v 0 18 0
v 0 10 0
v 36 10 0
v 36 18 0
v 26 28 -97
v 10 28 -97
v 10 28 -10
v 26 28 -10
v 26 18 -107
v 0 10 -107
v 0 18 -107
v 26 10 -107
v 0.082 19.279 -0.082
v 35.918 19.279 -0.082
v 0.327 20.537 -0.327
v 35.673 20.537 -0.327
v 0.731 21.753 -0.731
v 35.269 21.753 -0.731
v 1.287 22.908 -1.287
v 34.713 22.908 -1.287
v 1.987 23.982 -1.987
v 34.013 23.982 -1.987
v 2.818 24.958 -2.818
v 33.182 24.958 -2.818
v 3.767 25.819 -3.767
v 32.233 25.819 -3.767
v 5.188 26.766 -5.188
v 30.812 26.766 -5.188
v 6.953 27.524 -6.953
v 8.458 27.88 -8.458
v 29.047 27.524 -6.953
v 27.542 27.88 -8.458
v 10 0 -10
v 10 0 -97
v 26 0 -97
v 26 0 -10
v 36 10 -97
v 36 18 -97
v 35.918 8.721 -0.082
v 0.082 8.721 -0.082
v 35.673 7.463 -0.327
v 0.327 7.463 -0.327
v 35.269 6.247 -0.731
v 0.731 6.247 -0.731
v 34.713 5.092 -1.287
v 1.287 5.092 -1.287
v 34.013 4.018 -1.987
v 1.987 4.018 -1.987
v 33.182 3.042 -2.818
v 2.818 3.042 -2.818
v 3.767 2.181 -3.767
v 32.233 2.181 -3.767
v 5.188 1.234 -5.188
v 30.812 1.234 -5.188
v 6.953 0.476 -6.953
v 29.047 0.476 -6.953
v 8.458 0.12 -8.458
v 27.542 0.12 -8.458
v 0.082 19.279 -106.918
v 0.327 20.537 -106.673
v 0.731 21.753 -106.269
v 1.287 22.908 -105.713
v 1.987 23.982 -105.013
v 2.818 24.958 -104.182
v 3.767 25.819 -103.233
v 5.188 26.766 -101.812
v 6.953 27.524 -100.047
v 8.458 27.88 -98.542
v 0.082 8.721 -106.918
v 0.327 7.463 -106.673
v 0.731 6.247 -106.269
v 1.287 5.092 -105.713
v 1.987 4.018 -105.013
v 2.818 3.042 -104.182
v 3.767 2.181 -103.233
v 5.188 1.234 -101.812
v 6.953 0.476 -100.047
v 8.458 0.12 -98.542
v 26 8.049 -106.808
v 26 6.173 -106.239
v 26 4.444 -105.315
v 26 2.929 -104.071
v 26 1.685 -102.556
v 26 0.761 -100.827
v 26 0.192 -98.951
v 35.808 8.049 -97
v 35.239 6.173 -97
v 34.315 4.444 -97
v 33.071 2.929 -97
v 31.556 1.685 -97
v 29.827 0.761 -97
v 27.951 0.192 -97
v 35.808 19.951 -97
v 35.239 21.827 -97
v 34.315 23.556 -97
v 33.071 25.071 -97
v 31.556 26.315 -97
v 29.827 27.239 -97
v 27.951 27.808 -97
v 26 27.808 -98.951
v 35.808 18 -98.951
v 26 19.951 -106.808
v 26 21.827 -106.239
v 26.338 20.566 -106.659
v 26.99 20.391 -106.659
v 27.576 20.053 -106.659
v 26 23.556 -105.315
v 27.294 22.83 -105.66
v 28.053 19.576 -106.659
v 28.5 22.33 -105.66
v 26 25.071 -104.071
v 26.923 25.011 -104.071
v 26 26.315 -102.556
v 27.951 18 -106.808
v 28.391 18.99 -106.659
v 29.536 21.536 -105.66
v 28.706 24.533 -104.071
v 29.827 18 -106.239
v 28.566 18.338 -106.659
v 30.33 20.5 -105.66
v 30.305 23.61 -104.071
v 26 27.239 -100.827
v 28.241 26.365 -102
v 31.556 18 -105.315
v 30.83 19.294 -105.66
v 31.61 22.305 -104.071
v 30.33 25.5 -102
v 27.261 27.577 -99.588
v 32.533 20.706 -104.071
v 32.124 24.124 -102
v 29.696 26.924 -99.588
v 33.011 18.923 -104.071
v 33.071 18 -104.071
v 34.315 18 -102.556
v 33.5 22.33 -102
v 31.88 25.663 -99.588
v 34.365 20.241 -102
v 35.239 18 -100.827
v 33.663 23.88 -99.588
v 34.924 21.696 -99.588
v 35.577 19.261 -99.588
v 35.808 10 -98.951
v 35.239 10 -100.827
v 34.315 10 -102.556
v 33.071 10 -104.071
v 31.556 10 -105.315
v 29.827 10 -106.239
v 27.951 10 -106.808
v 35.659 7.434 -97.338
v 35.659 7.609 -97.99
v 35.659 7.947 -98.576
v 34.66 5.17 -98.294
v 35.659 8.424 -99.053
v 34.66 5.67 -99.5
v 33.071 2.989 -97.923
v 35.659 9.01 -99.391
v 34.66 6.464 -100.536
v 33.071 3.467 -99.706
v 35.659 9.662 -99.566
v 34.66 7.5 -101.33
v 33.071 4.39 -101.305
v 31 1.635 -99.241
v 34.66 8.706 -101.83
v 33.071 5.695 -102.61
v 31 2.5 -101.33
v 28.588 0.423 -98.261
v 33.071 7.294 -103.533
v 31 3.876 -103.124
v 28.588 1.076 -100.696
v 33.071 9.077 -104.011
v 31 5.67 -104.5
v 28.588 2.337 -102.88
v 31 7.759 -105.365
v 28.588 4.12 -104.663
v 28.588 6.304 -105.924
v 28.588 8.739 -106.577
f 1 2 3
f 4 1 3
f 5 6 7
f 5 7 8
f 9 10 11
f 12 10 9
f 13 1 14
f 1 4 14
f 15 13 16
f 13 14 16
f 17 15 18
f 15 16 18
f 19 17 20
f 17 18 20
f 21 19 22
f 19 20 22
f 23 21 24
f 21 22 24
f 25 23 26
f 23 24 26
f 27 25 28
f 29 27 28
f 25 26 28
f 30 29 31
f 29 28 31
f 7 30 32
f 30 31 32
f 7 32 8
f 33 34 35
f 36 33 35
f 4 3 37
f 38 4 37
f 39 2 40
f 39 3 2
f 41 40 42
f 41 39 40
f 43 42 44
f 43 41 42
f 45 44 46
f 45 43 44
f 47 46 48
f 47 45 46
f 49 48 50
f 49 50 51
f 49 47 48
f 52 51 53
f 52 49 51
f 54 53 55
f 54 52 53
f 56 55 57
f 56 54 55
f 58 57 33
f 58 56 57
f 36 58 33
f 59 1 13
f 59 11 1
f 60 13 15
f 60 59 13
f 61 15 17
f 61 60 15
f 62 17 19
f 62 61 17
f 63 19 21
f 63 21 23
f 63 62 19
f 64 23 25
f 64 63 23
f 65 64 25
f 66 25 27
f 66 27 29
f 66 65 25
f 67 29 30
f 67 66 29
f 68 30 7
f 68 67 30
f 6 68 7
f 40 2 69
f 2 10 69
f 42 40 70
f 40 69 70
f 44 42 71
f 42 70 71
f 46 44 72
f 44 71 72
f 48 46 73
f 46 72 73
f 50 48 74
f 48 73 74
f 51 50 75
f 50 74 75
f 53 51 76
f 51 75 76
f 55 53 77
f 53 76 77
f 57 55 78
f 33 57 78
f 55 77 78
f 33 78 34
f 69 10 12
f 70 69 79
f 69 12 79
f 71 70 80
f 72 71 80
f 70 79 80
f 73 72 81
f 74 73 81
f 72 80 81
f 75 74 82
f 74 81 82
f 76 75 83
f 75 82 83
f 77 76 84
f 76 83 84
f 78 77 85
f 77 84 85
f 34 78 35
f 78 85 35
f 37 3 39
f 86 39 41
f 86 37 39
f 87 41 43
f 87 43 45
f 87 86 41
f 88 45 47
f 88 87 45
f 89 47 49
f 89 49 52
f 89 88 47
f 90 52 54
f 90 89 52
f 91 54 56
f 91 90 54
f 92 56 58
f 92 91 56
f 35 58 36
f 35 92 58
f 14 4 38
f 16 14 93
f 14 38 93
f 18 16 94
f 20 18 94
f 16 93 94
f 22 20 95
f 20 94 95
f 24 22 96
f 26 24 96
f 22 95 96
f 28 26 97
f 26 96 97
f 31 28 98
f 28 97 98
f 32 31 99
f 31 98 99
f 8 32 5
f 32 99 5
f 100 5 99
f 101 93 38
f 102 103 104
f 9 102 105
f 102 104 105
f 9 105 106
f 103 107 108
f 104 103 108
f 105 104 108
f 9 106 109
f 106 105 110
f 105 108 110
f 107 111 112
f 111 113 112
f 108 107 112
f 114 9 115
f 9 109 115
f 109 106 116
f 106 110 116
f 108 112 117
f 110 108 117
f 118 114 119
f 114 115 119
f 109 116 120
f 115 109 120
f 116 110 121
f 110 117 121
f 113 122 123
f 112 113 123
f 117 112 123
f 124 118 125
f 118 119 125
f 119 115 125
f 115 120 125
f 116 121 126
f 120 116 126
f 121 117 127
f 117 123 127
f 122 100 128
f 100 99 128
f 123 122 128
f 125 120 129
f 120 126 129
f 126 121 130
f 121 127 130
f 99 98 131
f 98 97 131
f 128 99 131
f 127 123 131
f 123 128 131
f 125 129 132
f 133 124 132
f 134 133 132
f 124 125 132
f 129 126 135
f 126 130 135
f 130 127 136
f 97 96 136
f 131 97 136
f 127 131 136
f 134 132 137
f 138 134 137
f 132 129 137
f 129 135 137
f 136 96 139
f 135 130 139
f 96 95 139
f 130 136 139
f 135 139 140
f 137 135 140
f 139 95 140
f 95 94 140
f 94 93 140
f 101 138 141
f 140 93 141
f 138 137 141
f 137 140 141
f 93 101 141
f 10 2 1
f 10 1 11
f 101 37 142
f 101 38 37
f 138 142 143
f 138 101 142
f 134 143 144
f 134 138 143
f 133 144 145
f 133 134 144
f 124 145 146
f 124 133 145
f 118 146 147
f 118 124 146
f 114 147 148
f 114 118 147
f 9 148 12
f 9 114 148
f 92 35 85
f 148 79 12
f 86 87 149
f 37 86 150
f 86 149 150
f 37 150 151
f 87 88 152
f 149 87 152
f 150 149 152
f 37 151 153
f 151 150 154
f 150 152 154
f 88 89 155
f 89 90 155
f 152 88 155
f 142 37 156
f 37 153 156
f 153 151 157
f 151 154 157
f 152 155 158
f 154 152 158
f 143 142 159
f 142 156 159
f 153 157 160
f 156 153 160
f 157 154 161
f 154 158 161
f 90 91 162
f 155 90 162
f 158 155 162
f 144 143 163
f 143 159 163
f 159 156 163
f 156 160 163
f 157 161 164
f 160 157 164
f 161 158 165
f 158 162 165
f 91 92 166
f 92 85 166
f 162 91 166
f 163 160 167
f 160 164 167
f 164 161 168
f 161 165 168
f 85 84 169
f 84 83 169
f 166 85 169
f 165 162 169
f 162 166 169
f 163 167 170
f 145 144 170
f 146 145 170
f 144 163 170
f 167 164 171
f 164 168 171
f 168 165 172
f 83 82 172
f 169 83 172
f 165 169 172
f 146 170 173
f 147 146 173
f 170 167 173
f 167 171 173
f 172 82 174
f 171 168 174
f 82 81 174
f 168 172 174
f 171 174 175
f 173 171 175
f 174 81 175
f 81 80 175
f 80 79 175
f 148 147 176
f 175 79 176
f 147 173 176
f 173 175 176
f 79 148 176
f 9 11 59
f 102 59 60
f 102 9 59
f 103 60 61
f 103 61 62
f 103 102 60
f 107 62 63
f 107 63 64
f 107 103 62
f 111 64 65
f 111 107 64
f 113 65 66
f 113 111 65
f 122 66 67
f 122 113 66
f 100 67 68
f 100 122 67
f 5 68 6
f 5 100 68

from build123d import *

# Parameters (mm, degrees)
SKETCH1_W           = 36
SKETCH1_H           = 107
BOSS_EXTRUDE1_DEPTH = 28
FILLET1_R           = 10


with BuildPart() as part:
    # Sketch1 → Boss-Extrude1 (new body)
    with BuildSketch(Plane(origin=(0, 0, 0), x_dir=(1, 0, 0), z_dir=(0, 1, 0))):
        with Locations((18, 53.5)):
            Rectangle(SKETCH1_W, SKETCH1_H)
    extrude(amount=BOSS_EXTRUDE1_DEPTH)

    # Fillet1
    fillet1_edges = [part.edges().sort_by_distance(p)[0] for p in [
        (36, 28, -53.5),
        (18, 28, -107),
        (0, 28, -53.5),
        (18, 0, -107),
        (36, 0, -53.5),
        (18, 0, 0),
        (0, 0, -53.5),
        (18, 28, 0),
        (36, 14, -107),
    ]]
    fillet(fillet1_edges, radius=FILLET1_R)


solid = part.part
